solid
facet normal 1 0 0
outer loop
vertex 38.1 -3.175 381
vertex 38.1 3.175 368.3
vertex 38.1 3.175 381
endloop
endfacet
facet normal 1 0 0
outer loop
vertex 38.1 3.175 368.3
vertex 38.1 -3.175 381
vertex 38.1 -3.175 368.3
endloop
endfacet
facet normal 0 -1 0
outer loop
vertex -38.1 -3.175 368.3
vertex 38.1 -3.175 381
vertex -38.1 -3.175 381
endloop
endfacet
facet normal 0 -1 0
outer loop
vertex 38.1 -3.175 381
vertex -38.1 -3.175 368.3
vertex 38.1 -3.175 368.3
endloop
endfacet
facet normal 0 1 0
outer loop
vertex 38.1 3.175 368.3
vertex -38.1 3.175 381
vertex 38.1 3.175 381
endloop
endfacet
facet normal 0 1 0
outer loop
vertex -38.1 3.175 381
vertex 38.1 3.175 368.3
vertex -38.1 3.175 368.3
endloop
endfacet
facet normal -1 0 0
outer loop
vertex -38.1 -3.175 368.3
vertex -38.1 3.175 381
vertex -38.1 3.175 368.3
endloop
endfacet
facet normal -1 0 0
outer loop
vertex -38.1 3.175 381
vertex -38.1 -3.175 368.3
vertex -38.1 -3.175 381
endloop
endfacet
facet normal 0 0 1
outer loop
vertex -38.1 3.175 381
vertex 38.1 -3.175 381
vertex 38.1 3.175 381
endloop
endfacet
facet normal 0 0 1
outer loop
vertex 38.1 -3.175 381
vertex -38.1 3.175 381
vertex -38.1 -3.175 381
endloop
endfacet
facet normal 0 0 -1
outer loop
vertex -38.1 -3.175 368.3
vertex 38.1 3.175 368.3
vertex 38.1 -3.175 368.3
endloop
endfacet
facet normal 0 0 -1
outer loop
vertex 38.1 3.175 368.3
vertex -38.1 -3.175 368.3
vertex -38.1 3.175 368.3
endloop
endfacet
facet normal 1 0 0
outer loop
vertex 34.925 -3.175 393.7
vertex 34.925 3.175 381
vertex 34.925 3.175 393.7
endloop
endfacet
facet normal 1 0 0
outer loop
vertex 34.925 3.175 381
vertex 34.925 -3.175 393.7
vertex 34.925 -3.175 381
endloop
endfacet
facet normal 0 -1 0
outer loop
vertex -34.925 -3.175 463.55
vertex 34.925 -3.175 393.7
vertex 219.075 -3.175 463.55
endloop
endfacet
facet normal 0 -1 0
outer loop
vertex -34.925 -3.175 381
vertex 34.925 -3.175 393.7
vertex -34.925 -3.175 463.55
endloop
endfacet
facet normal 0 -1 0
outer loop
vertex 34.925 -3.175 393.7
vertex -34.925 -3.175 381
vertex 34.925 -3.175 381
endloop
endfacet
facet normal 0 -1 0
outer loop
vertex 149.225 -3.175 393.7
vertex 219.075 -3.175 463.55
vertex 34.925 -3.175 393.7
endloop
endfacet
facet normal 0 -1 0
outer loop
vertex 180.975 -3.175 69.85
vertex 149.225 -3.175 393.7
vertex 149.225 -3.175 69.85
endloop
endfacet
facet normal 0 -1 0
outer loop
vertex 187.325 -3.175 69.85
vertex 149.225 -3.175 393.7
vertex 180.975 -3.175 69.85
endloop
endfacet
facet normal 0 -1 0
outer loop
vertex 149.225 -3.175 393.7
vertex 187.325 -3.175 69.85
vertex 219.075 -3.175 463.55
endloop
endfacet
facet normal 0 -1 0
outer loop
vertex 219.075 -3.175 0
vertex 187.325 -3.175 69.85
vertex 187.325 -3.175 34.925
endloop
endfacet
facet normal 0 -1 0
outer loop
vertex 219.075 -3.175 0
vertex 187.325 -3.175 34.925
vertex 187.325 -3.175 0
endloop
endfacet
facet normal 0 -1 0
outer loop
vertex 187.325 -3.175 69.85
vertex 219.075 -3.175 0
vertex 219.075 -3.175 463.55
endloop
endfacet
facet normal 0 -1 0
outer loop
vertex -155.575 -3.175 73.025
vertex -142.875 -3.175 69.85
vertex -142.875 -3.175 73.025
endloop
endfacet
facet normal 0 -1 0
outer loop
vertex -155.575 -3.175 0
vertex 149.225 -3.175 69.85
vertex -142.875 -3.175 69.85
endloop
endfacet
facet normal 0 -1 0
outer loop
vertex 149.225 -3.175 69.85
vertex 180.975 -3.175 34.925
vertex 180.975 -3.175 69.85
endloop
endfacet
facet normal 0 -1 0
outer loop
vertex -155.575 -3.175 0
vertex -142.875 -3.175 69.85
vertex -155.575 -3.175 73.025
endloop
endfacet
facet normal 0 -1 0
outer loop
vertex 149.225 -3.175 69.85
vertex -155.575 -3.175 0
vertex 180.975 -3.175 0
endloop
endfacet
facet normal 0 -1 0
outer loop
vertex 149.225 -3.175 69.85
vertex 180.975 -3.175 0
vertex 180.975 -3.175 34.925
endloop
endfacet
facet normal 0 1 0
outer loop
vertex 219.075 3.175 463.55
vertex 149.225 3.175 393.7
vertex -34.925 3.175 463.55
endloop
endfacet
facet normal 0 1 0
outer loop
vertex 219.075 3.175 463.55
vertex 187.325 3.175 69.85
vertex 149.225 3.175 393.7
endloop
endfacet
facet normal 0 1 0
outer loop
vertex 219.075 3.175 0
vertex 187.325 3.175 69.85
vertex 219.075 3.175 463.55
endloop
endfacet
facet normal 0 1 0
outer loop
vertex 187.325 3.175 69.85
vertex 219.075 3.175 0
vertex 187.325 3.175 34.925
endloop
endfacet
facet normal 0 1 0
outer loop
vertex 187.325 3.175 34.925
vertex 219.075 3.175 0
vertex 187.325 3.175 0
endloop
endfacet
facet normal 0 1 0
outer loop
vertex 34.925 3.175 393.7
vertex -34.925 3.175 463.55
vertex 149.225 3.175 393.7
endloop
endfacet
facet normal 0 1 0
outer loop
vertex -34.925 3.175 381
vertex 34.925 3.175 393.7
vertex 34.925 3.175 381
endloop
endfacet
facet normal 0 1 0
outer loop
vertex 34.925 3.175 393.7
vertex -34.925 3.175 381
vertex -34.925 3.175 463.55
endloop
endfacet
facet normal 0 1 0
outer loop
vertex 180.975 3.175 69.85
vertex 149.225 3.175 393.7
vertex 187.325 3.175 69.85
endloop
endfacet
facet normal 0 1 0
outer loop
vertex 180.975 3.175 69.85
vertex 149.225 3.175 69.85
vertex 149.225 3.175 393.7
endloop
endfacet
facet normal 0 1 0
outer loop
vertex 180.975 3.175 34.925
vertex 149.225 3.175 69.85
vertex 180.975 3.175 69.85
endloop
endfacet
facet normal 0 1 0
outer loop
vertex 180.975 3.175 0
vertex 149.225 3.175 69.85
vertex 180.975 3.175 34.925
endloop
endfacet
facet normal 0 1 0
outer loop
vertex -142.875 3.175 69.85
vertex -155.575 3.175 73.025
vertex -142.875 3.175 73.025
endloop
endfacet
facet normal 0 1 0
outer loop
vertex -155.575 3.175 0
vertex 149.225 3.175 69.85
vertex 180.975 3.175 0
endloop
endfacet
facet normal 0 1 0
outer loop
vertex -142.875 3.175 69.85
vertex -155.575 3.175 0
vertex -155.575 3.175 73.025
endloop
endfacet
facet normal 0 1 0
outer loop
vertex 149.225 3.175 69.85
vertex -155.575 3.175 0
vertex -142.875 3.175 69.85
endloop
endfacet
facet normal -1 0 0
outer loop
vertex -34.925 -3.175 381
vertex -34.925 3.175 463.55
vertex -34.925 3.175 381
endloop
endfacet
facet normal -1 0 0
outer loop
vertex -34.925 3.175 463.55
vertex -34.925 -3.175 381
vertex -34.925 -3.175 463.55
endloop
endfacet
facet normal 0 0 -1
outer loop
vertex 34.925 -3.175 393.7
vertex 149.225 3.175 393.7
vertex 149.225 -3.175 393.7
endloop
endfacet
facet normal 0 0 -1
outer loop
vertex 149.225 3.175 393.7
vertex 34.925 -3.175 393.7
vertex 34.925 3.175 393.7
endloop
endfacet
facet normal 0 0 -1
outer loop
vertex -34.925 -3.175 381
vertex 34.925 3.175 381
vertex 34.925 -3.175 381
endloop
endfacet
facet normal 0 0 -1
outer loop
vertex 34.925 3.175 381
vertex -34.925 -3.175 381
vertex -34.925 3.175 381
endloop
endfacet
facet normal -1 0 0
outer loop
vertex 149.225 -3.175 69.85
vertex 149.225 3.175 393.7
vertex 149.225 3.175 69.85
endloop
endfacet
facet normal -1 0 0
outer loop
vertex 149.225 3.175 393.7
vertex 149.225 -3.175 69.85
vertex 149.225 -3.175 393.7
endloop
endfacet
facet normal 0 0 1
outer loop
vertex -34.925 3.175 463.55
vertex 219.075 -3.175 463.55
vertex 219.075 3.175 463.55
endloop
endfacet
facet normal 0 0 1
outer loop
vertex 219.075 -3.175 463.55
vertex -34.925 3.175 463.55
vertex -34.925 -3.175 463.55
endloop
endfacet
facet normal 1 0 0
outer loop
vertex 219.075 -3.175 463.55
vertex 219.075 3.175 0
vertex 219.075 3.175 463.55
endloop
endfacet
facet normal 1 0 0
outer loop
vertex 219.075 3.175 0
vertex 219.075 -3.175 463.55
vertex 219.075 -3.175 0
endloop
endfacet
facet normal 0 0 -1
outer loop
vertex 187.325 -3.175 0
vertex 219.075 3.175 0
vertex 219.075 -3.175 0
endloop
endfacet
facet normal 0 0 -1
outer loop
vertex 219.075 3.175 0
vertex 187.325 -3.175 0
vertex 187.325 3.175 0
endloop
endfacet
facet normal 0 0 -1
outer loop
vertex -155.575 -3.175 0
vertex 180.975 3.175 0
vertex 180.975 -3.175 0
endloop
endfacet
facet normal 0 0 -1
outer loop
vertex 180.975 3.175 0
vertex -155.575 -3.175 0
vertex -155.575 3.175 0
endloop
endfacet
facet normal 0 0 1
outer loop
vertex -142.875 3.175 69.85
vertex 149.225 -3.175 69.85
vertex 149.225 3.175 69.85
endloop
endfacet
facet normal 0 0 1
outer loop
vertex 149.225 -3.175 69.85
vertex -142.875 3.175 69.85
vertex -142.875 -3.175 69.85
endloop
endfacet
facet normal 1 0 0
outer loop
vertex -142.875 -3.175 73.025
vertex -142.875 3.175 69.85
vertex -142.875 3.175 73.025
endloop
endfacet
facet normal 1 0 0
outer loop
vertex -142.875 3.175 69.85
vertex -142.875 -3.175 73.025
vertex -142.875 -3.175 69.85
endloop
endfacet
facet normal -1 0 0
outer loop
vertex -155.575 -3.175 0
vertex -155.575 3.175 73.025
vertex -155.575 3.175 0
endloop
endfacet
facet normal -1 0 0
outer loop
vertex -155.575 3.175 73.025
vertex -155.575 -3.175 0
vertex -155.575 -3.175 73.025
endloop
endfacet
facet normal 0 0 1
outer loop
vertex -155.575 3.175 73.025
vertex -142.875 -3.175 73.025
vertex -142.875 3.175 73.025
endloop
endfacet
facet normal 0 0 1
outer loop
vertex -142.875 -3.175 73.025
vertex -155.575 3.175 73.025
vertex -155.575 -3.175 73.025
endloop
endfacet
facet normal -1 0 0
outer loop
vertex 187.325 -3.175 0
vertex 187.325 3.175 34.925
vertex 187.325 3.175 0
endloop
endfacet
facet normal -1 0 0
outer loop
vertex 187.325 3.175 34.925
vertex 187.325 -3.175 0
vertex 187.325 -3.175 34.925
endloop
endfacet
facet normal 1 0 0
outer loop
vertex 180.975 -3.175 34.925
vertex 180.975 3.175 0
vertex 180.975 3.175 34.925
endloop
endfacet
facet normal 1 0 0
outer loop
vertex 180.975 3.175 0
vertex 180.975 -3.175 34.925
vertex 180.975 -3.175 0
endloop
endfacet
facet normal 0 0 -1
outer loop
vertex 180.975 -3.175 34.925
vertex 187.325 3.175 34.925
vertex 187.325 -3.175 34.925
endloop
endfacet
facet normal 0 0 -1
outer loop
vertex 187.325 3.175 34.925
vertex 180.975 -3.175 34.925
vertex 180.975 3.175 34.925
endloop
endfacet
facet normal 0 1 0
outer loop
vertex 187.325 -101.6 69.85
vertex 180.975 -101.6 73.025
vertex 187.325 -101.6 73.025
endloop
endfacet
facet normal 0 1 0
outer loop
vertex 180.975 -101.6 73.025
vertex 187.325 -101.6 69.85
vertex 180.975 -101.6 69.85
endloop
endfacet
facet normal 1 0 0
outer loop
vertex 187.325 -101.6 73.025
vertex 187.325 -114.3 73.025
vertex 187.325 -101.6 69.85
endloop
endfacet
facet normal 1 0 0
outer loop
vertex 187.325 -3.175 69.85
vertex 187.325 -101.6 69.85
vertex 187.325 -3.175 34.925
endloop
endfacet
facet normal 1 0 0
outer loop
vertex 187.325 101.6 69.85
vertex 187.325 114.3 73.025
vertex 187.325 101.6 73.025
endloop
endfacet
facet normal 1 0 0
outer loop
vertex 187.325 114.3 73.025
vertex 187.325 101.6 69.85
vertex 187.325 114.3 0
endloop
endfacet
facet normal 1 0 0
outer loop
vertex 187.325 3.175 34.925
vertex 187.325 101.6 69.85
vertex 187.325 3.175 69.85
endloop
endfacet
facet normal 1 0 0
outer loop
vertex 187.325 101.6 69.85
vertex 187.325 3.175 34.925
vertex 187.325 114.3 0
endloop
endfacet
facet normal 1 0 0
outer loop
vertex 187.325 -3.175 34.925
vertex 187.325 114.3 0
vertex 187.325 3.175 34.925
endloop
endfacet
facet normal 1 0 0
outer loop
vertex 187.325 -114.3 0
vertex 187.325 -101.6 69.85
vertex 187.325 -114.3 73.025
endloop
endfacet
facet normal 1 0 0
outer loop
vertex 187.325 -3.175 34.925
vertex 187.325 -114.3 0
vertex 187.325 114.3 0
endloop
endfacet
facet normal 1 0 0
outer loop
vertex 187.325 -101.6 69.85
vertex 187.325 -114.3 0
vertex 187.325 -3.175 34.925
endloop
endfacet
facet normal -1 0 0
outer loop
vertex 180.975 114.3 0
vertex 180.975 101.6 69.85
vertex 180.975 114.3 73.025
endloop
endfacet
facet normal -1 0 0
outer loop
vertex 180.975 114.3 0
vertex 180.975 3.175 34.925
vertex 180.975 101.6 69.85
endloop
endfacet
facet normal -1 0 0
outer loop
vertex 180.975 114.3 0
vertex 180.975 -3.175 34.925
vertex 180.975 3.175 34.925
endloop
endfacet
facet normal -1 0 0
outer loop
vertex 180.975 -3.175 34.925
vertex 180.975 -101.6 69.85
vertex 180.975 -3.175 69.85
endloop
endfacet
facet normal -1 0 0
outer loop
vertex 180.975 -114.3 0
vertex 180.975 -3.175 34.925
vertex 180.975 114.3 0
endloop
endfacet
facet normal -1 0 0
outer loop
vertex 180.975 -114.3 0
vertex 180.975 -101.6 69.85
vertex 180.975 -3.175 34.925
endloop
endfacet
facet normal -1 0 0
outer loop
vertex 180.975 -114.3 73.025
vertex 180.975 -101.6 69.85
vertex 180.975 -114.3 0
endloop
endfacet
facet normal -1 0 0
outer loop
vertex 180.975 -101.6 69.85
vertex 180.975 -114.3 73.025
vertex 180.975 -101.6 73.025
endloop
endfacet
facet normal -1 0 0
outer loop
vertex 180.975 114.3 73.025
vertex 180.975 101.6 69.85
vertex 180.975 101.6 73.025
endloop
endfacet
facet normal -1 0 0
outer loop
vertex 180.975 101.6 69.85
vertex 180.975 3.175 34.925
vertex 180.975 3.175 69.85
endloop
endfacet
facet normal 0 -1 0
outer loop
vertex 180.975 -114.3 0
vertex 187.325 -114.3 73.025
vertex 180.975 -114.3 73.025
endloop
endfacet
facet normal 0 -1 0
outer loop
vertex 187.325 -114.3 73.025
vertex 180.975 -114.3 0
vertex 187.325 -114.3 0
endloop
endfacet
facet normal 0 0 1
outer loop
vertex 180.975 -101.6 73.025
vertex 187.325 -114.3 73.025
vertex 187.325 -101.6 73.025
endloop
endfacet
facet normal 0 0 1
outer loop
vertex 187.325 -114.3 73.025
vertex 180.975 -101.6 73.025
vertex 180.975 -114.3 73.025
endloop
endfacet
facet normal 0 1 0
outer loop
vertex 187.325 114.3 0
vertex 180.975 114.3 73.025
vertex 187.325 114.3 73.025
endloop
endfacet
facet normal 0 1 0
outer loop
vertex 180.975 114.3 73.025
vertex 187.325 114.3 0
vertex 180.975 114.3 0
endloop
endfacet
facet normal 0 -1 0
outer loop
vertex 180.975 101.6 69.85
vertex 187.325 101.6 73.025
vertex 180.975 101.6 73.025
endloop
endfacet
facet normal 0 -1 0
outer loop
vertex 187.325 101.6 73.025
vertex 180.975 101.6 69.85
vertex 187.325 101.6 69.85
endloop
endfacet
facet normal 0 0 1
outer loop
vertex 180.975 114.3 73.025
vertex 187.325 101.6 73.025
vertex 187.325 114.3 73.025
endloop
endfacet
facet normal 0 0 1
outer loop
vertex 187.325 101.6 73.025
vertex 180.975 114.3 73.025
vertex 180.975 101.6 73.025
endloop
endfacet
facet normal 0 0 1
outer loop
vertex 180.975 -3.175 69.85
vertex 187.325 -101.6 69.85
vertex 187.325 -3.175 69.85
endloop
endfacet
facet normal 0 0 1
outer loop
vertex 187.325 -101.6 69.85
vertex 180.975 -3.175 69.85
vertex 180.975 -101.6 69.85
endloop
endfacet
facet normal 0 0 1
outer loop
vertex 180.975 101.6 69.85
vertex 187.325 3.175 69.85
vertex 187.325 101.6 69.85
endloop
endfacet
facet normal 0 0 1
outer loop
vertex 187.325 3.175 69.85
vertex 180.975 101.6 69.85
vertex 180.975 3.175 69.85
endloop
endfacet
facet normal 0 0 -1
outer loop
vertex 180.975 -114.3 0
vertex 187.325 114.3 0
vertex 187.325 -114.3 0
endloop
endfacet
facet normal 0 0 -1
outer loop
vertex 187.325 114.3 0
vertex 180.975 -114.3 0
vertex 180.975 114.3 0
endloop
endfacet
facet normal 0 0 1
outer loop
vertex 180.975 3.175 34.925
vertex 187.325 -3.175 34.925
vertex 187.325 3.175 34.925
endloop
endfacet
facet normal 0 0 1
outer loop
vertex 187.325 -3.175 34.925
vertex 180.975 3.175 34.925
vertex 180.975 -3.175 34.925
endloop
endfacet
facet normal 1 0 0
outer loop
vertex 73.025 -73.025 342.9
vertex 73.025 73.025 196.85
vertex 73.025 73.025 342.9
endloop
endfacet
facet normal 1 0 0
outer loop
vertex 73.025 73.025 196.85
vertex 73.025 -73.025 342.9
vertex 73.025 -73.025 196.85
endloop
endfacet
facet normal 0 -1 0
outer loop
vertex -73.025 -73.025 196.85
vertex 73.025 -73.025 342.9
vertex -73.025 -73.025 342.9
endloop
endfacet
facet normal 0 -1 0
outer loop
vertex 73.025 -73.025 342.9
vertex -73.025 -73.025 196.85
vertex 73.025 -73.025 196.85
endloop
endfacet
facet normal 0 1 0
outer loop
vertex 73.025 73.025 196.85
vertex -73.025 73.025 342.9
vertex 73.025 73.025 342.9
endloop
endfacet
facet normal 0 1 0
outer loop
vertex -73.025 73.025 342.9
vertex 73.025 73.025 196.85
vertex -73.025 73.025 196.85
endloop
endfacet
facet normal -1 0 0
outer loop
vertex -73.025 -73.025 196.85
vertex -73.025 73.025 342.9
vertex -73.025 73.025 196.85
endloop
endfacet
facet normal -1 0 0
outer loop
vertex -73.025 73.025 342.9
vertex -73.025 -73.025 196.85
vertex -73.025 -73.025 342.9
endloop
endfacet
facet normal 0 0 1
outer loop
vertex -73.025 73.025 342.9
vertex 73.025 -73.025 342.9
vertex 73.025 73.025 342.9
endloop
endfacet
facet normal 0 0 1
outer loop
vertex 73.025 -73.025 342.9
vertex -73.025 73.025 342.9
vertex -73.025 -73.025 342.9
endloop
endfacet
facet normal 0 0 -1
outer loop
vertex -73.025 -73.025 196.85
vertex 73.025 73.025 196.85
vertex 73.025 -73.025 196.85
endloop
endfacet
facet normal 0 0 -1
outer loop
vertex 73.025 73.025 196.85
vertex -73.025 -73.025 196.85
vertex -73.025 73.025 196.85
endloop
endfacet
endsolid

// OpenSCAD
lamp_side_dim = 5.75 * 25.4;

t = 0.250 * 25.4;

corner_r = 3 * 25.4;
pipe_d = 2.75 * 25.4;
flange_depth = 1/2 * 25.4;

clearance_above = 2 * 25.4;
clearance_below = 5 * 25.4;
clearance_side = 3 * 25.4;

slot_depth = pipe_d/2;

side_feet_width = 4*25.4;

translate([0, 0, lamp_side_dim/2 + clearance_below + pipe_d]) rotate([90, 0, 0]) {
  // lamp blank
  cube(size=[lamp_side_dim, lamp_side_dim, lamp_side_dim], center=true);

  // main piece
  render()
  difference() {
    union() {
      translate([0, lamp_side_dim/2 + clearance_above - flange_depth - flange_depth/2, 0]) 
        cube(size=[corner_r, flange_depth, t], center=true);

      translate([0, lamp_side_dim/2 + clearance_above - flange_depth/2, 0]) 
        cube(size=[pipe_d, flange_depth, t], center=true);

      translate([(pipe_d/2 + lamp_side_dim/2 + clearance_side)/2 - pipe_d/2, lamp_side_dim/2 + clearance_above + pipe_d/2, 0]) 
        cube(size=[pipe_d/2 + lamp_side_dim/2 + clearance_side, pipe_d, t], center=true);

      translate([lamp_side_dim/2 + clearance_side + pipe_d/2, -lamp_side_dim/2 - clearance_below - pipe_d + (clearance_above + clearance_below + lamp_side_dim + pipe_d*2)/2, 0]) 
        cube(size=[pipe_d, clearance_above + clearance_below + lamp_side_dim + pipe_d*2, t], center=true);

      translate([0, -lamp_side_dim/2 - clearance_below - pipe_d/2, 0]) cube(size=[clearance_side * 2 + lamp_side_dim, pipe_d, t], center=true);

      translate([(clearance_side * 2 + lamp_side_dim)/-2, -lamp_side_dim/2 - clearance_below - pipe_d/2 + (corner_r - pipe_d)/4, 0]) 
        cube(size=[flange_depth, corner_r - (corner_r - pipe_d)/2, t], center=true);
    }
    translate([lamp_side_dim/2 + clearance_side + pipe_d/2, -lamp_side_dim/2 - clearance_below - pipe_d, 0]) 
      cube(size=[t, slot_depth*2, t*2], center=true);
  }
  
  
  // cross piece
  translate([lamp_side_dim/2 + clearance_side + pipe_d/2, -lamp_side_dim/2 - clearance_below - pipe_d, 0]) rotate([0, 90, 0]) {
    translate([0, pipe_d/2, 0]) 
    render()
    difference() {
      union() {
        cube(size=[side_feet_width * 2 + t, pipe_d, t], center=true);
        for (x=[-1,1]) {
          translate([x * (side_feet_width + flange_depth/2), 0, 0]) cube(size=[flange_depth, corner_r, t], center=true);
        }
      }
      translate([0, -pipe_d/2 - 10, 0]) cube(size=[side_feet_width*3, 20, t*2], center=true);
      translate([0, pipe_d/2, 0]) cube(size=[t, slot_depth*2, t*2], center=true);
    }
  }
}
